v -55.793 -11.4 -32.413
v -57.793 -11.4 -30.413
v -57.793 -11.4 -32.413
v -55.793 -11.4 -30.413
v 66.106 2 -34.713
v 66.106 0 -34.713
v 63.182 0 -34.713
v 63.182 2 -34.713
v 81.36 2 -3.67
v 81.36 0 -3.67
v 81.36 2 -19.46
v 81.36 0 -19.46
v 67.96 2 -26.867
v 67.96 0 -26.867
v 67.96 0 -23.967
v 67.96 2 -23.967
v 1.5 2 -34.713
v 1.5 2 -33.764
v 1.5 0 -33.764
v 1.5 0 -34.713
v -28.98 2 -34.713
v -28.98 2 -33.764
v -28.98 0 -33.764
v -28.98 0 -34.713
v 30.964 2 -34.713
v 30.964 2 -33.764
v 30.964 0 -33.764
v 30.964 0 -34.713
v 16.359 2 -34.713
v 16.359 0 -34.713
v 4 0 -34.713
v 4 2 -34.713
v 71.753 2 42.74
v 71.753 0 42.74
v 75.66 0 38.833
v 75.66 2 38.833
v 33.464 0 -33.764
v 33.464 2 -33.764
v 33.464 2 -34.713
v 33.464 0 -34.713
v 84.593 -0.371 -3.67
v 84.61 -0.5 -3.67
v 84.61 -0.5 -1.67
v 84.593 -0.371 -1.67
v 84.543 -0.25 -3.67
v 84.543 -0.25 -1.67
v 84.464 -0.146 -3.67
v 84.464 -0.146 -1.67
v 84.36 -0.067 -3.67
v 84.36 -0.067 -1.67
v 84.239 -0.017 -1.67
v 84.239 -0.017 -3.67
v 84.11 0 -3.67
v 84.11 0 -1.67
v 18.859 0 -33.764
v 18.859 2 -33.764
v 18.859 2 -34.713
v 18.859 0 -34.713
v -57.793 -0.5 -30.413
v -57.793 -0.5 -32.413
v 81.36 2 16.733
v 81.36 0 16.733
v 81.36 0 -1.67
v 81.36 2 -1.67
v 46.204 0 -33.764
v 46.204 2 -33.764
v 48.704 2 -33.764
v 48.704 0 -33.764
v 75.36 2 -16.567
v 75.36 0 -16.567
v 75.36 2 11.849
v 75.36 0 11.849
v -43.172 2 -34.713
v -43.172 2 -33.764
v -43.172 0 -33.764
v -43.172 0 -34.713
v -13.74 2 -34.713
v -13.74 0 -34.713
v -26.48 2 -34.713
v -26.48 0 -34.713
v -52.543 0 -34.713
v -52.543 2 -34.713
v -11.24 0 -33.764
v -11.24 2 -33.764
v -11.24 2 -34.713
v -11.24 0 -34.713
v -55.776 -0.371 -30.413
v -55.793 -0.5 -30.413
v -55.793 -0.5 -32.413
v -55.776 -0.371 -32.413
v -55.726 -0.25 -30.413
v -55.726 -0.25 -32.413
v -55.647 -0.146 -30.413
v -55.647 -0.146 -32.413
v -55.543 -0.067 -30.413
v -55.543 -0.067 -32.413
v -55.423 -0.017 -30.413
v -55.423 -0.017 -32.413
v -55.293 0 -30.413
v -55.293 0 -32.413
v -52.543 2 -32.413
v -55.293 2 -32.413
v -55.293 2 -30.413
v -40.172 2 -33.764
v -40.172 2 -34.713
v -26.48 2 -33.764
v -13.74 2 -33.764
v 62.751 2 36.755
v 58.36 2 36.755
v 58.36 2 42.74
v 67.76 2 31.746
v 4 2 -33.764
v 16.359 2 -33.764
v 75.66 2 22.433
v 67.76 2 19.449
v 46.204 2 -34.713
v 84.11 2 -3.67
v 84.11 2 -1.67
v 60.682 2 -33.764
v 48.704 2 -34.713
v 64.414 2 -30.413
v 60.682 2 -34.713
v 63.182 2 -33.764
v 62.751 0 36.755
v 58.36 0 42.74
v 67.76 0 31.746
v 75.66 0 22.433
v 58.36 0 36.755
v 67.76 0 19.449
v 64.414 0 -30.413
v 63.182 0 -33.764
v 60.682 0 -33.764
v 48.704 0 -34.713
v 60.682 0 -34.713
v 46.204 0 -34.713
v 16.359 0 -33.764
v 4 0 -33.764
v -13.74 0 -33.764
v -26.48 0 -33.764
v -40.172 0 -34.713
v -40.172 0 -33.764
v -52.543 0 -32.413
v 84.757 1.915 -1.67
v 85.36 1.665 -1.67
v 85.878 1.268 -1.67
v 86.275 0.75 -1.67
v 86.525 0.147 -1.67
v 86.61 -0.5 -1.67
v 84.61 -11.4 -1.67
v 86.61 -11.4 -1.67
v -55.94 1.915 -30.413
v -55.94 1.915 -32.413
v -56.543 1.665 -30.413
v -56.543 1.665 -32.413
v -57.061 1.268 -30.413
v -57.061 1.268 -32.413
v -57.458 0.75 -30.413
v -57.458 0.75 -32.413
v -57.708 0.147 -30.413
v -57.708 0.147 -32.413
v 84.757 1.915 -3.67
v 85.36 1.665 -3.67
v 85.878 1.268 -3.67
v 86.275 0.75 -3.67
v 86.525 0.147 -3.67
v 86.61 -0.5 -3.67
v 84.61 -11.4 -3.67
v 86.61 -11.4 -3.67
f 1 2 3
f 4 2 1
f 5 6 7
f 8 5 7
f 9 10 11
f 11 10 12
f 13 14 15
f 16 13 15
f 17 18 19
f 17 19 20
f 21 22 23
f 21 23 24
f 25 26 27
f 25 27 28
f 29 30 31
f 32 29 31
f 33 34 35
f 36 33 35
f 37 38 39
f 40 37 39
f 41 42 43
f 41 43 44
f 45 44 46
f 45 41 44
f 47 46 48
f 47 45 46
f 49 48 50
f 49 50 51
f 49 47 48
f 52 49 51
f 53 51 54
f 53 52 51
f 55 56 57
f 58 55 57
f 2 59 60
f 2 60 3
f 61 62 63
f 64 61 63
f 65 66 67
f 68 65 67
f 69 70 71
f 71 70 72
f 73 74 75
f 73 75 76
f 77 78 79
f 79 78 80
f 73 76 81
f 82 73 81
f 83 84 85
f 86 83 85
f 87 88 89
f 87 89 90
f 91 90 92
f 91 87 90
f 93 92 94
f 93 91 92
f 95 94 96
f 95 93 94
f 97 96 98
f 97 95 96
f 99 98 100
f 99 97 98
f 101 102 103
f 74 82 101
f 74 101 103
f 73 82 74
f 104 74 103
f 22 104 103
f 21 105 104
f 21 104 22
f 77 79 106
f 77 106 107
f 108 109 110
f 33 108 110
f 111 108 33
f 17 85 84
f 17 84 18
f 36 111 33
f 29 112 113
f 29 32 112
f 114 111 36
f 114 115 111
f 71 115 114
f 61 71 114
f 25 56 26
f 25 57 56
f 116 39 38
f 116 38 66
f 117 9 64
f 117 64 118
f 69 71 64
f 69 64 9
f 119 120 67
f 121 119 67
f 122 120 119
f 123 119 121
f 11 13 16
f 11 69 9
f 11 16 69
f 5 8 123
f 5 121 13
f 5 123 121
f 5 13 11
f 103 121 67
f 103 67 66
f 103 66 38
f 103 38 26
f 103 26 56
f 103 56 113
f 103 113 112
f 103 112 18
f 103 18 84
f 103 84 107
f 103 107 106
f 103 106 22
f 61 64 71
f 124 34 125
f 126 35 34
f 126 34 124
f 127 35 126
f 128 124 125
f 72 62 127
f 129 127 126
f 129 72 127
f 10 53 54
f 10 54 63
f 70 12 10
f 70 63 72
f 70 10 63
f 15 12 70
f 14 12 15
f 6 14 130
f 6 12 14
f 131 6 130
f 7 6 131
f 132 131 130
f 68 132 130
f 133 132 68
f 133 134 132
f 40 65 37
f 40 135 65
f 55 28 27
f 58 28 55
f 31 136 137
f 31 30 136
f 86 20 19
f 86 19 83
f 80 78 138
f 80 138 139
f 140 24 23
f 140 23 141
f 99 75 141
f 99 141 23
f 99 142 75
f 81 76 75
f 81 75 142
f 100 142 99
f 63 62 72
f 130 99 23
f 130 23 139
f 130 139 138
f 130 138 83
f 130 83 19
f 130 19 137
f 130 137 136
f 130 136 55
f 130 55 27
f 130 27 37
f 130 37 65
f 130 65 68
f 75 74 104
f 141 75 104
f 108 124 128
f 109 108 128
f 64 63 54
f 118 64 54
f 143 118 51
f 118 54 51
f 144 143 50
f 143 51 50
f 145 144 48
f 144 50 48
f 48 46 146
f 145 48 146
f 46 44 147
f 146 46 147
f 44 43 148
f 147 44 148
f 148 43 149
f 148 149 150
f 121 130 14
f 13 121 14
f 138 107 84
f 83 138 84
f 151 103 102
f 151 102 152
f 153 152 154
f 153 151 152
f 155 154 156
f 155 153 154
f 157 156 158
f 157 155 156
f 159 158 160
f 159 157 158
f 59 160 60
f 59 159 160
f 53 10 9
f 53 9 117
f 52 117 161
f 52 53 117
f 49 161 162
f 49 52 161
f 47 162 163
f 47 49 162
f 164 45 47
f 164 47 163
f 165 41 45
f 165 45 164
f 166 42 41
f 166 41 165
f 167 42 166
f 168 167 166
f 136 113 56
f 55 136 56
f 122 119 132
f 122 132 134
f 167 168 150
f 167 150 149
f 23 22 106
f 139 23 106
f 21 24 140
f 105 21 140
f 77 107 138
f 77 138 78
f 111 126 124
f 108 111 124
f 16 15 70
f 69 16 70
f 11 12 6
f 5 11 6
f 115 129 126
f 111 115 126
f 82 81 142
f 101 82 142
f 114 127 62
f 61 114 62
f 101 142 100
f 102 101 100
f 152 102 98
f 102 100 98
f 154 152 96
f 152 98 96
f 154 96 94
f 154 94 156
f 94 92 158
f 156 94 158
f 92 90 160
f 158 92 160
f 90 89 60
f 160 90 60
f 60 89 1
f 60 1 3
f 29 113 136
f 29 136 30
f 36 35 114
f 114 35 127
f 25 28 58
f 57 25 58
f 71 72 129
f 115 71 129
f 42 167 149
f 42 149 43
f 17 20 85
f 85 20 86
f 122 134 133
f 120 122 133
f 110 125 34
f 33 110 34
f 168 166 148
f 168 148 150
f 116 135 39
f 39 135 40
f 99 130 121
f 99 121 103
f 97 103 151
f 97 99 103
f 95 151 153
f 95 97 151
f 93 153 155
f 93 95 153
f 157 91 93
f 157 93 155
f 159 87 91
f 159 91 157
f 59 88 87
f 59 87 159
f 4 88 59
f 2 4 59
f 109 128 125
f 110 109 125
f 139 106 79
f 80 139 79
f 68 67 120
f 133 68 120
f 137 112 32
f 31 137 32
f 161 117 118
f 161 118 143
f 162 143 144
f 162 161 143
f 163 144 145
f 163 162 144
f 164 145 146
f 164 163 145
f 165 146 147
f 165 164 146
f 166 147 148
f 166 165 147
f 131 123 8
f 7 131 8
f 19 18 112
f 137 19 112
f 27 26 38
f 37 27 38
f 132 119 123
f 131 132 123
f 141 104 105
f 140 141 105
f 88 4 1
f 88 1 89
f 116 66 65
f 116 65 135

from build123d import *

# Parameters (mm, degrees)
BOSS_EXTRUDE1_DEPTH = 2
EDGE_FLANGE1_DEPTH  = 2
EDGE_FLANGE2_DEPTH  = 2
SKETCH13_W          = 2.5
SKETCH13_H          = 2.15
SKETCH13_W_2        = 3
CUT_EXTRUDE3_DEPTH  = 10


# Sheet-metal steps are written as plain solids
with BuildPart() as part:
    # Sketch2 → Boss-Extrude1 (new body)
    with BuildSketch(Plane(origin=(0, 0, 0), x_dir=(1, 0, 0), z_dir=(0, 1, 0))):
        Polygon((-52.543309772, 32.413356753), (-54.793309772, 32.413356753), (-54.793309772, 30.413356753), (64.413548219, 30.413356753), (67.959993108, 26.866911863), (67.959993108, 23.966910068), (75.359993548, 16.566912168), (75.359993548, -11.849150158), (67.759993508, -19.449150198), (67.759993508, -31.745752353), (62.750836838, -36.754909023), (58.359994528, -36.754909023), (58.359994528, -42.739906444), (71.753176861, -42.739906444), (75.659994488, -38.833088817), (75.659994488, -22.433088597), (81.359993248, -16.733089837), (81.359993248, 1.669814581), (83.609993248, 1.669814581), (83.609993248, 3.669814581), (81.359993248, 3.669814581), (81.359993248, 19.459804242), (66.106440177, 34.713357313), (-52.543309772, 34.713357313), align=None)
    extrude(amount=BOSS_EXTRUDE1_DEPTH)

    # Edge-Flange1 section (across the edge) → Edge-Flange1 (add)
    with BuildSketch(Plane(origin=(-55.793309772, 0, -30.413356753), x_dir=(1, 0, 0), z_dir=(0, 0, -1))):
        with BuildLine():
            Line((-2, 0.5), (-2, 11.4))
            Line((-2, 11.4), (0, 11.4))
            Line((0, 11.4), (0, 0.5))
            ThreePointArc((0, 0.5), (0.146446609, 0.146446609), (0.5, 0))
            Line((0.5, 0), (1, 0))
            Line((1, 0), (1, -2))
            Line((1, -2), (0.5, -2))
            ThreePointArc((0.5, -2), (-1.267766953, -1.267766953), (-2, 0.5))
        make_face()
    extrude(amount=EDGE_FLANGE1_DEPTH)

    # Edge-Flange2 section (across the edge) → Edge-Flange2 (add)
    with BuildSketch(Plane(origin=(84.609993248, 0, -3.669814581), x_dir=(-1, 0, 0), z_dir=(0, 0, 1))):
        with BuildLine():
            Line((-2, 0.5), (-2, 11.4))
            Line((-2, 11.4), (0, 11.4))
            Line((0, 11.4), (0, 0.5))
            ThreePointArc((0, 0.5), (0.146446609, 0.146446609), (0.5, 0))
            Line((0.5, 0), (1, 0))
            Line((1, 0), (1, -2))
            Line((1, -2), (0.5, -2))
            ThreePointArc((0.5, -2), (-1.267766953, -1.267766953), (-2, 0.5))
        make_face()
    extrude(amount=EDGE_FLANGE2_DEPTH)

    # Sketch13 → Cut-Extrude3 (cut)
    with BuildSketch(Plane(origin=(0, 2, 0), x_dir=(1, 0, 0), z_dir=(0, 1, 0))):
        with Locations((-27.730006168, 34.839358373)):
            Rectangle(SKETCH13_W, SKETCH13_H)
        with Locations((-41.672006168, 34.839358373)):
            Rectangle(SKETCH13_W_2, SKETCH13_H)
        with Locations((-12.490006168, 34.839358373)):
            Rectangle(SKETCH13_W, SKETCH13_H)
        with Locations((2.749993832, 34.839358373)):
            Rectangle(SKETCH13_W, SKETCH13_H)
        with Locations((17.608993832, 34.839358373)):
            Rectangle(SKETCH13_W, SKETCH13_H)
        with Locations((32.213993832, 34.839358373)):
            Rectangle(SKETCH13_W, SKETCH13_H)
        with Locations((47.453993832, 34.839358373)):
            Rectangle(SKETCH13_W, SKETCH13_H)
        with Locations((61.931993832, 34.839358373)):
            Rectangle(SKETCH13_W, SKETCH13_H)
    extrude(amount=-CUT_EXTRUDE3_DEPTH, mode=Mode.SUBTRACT)


solid = part.part
